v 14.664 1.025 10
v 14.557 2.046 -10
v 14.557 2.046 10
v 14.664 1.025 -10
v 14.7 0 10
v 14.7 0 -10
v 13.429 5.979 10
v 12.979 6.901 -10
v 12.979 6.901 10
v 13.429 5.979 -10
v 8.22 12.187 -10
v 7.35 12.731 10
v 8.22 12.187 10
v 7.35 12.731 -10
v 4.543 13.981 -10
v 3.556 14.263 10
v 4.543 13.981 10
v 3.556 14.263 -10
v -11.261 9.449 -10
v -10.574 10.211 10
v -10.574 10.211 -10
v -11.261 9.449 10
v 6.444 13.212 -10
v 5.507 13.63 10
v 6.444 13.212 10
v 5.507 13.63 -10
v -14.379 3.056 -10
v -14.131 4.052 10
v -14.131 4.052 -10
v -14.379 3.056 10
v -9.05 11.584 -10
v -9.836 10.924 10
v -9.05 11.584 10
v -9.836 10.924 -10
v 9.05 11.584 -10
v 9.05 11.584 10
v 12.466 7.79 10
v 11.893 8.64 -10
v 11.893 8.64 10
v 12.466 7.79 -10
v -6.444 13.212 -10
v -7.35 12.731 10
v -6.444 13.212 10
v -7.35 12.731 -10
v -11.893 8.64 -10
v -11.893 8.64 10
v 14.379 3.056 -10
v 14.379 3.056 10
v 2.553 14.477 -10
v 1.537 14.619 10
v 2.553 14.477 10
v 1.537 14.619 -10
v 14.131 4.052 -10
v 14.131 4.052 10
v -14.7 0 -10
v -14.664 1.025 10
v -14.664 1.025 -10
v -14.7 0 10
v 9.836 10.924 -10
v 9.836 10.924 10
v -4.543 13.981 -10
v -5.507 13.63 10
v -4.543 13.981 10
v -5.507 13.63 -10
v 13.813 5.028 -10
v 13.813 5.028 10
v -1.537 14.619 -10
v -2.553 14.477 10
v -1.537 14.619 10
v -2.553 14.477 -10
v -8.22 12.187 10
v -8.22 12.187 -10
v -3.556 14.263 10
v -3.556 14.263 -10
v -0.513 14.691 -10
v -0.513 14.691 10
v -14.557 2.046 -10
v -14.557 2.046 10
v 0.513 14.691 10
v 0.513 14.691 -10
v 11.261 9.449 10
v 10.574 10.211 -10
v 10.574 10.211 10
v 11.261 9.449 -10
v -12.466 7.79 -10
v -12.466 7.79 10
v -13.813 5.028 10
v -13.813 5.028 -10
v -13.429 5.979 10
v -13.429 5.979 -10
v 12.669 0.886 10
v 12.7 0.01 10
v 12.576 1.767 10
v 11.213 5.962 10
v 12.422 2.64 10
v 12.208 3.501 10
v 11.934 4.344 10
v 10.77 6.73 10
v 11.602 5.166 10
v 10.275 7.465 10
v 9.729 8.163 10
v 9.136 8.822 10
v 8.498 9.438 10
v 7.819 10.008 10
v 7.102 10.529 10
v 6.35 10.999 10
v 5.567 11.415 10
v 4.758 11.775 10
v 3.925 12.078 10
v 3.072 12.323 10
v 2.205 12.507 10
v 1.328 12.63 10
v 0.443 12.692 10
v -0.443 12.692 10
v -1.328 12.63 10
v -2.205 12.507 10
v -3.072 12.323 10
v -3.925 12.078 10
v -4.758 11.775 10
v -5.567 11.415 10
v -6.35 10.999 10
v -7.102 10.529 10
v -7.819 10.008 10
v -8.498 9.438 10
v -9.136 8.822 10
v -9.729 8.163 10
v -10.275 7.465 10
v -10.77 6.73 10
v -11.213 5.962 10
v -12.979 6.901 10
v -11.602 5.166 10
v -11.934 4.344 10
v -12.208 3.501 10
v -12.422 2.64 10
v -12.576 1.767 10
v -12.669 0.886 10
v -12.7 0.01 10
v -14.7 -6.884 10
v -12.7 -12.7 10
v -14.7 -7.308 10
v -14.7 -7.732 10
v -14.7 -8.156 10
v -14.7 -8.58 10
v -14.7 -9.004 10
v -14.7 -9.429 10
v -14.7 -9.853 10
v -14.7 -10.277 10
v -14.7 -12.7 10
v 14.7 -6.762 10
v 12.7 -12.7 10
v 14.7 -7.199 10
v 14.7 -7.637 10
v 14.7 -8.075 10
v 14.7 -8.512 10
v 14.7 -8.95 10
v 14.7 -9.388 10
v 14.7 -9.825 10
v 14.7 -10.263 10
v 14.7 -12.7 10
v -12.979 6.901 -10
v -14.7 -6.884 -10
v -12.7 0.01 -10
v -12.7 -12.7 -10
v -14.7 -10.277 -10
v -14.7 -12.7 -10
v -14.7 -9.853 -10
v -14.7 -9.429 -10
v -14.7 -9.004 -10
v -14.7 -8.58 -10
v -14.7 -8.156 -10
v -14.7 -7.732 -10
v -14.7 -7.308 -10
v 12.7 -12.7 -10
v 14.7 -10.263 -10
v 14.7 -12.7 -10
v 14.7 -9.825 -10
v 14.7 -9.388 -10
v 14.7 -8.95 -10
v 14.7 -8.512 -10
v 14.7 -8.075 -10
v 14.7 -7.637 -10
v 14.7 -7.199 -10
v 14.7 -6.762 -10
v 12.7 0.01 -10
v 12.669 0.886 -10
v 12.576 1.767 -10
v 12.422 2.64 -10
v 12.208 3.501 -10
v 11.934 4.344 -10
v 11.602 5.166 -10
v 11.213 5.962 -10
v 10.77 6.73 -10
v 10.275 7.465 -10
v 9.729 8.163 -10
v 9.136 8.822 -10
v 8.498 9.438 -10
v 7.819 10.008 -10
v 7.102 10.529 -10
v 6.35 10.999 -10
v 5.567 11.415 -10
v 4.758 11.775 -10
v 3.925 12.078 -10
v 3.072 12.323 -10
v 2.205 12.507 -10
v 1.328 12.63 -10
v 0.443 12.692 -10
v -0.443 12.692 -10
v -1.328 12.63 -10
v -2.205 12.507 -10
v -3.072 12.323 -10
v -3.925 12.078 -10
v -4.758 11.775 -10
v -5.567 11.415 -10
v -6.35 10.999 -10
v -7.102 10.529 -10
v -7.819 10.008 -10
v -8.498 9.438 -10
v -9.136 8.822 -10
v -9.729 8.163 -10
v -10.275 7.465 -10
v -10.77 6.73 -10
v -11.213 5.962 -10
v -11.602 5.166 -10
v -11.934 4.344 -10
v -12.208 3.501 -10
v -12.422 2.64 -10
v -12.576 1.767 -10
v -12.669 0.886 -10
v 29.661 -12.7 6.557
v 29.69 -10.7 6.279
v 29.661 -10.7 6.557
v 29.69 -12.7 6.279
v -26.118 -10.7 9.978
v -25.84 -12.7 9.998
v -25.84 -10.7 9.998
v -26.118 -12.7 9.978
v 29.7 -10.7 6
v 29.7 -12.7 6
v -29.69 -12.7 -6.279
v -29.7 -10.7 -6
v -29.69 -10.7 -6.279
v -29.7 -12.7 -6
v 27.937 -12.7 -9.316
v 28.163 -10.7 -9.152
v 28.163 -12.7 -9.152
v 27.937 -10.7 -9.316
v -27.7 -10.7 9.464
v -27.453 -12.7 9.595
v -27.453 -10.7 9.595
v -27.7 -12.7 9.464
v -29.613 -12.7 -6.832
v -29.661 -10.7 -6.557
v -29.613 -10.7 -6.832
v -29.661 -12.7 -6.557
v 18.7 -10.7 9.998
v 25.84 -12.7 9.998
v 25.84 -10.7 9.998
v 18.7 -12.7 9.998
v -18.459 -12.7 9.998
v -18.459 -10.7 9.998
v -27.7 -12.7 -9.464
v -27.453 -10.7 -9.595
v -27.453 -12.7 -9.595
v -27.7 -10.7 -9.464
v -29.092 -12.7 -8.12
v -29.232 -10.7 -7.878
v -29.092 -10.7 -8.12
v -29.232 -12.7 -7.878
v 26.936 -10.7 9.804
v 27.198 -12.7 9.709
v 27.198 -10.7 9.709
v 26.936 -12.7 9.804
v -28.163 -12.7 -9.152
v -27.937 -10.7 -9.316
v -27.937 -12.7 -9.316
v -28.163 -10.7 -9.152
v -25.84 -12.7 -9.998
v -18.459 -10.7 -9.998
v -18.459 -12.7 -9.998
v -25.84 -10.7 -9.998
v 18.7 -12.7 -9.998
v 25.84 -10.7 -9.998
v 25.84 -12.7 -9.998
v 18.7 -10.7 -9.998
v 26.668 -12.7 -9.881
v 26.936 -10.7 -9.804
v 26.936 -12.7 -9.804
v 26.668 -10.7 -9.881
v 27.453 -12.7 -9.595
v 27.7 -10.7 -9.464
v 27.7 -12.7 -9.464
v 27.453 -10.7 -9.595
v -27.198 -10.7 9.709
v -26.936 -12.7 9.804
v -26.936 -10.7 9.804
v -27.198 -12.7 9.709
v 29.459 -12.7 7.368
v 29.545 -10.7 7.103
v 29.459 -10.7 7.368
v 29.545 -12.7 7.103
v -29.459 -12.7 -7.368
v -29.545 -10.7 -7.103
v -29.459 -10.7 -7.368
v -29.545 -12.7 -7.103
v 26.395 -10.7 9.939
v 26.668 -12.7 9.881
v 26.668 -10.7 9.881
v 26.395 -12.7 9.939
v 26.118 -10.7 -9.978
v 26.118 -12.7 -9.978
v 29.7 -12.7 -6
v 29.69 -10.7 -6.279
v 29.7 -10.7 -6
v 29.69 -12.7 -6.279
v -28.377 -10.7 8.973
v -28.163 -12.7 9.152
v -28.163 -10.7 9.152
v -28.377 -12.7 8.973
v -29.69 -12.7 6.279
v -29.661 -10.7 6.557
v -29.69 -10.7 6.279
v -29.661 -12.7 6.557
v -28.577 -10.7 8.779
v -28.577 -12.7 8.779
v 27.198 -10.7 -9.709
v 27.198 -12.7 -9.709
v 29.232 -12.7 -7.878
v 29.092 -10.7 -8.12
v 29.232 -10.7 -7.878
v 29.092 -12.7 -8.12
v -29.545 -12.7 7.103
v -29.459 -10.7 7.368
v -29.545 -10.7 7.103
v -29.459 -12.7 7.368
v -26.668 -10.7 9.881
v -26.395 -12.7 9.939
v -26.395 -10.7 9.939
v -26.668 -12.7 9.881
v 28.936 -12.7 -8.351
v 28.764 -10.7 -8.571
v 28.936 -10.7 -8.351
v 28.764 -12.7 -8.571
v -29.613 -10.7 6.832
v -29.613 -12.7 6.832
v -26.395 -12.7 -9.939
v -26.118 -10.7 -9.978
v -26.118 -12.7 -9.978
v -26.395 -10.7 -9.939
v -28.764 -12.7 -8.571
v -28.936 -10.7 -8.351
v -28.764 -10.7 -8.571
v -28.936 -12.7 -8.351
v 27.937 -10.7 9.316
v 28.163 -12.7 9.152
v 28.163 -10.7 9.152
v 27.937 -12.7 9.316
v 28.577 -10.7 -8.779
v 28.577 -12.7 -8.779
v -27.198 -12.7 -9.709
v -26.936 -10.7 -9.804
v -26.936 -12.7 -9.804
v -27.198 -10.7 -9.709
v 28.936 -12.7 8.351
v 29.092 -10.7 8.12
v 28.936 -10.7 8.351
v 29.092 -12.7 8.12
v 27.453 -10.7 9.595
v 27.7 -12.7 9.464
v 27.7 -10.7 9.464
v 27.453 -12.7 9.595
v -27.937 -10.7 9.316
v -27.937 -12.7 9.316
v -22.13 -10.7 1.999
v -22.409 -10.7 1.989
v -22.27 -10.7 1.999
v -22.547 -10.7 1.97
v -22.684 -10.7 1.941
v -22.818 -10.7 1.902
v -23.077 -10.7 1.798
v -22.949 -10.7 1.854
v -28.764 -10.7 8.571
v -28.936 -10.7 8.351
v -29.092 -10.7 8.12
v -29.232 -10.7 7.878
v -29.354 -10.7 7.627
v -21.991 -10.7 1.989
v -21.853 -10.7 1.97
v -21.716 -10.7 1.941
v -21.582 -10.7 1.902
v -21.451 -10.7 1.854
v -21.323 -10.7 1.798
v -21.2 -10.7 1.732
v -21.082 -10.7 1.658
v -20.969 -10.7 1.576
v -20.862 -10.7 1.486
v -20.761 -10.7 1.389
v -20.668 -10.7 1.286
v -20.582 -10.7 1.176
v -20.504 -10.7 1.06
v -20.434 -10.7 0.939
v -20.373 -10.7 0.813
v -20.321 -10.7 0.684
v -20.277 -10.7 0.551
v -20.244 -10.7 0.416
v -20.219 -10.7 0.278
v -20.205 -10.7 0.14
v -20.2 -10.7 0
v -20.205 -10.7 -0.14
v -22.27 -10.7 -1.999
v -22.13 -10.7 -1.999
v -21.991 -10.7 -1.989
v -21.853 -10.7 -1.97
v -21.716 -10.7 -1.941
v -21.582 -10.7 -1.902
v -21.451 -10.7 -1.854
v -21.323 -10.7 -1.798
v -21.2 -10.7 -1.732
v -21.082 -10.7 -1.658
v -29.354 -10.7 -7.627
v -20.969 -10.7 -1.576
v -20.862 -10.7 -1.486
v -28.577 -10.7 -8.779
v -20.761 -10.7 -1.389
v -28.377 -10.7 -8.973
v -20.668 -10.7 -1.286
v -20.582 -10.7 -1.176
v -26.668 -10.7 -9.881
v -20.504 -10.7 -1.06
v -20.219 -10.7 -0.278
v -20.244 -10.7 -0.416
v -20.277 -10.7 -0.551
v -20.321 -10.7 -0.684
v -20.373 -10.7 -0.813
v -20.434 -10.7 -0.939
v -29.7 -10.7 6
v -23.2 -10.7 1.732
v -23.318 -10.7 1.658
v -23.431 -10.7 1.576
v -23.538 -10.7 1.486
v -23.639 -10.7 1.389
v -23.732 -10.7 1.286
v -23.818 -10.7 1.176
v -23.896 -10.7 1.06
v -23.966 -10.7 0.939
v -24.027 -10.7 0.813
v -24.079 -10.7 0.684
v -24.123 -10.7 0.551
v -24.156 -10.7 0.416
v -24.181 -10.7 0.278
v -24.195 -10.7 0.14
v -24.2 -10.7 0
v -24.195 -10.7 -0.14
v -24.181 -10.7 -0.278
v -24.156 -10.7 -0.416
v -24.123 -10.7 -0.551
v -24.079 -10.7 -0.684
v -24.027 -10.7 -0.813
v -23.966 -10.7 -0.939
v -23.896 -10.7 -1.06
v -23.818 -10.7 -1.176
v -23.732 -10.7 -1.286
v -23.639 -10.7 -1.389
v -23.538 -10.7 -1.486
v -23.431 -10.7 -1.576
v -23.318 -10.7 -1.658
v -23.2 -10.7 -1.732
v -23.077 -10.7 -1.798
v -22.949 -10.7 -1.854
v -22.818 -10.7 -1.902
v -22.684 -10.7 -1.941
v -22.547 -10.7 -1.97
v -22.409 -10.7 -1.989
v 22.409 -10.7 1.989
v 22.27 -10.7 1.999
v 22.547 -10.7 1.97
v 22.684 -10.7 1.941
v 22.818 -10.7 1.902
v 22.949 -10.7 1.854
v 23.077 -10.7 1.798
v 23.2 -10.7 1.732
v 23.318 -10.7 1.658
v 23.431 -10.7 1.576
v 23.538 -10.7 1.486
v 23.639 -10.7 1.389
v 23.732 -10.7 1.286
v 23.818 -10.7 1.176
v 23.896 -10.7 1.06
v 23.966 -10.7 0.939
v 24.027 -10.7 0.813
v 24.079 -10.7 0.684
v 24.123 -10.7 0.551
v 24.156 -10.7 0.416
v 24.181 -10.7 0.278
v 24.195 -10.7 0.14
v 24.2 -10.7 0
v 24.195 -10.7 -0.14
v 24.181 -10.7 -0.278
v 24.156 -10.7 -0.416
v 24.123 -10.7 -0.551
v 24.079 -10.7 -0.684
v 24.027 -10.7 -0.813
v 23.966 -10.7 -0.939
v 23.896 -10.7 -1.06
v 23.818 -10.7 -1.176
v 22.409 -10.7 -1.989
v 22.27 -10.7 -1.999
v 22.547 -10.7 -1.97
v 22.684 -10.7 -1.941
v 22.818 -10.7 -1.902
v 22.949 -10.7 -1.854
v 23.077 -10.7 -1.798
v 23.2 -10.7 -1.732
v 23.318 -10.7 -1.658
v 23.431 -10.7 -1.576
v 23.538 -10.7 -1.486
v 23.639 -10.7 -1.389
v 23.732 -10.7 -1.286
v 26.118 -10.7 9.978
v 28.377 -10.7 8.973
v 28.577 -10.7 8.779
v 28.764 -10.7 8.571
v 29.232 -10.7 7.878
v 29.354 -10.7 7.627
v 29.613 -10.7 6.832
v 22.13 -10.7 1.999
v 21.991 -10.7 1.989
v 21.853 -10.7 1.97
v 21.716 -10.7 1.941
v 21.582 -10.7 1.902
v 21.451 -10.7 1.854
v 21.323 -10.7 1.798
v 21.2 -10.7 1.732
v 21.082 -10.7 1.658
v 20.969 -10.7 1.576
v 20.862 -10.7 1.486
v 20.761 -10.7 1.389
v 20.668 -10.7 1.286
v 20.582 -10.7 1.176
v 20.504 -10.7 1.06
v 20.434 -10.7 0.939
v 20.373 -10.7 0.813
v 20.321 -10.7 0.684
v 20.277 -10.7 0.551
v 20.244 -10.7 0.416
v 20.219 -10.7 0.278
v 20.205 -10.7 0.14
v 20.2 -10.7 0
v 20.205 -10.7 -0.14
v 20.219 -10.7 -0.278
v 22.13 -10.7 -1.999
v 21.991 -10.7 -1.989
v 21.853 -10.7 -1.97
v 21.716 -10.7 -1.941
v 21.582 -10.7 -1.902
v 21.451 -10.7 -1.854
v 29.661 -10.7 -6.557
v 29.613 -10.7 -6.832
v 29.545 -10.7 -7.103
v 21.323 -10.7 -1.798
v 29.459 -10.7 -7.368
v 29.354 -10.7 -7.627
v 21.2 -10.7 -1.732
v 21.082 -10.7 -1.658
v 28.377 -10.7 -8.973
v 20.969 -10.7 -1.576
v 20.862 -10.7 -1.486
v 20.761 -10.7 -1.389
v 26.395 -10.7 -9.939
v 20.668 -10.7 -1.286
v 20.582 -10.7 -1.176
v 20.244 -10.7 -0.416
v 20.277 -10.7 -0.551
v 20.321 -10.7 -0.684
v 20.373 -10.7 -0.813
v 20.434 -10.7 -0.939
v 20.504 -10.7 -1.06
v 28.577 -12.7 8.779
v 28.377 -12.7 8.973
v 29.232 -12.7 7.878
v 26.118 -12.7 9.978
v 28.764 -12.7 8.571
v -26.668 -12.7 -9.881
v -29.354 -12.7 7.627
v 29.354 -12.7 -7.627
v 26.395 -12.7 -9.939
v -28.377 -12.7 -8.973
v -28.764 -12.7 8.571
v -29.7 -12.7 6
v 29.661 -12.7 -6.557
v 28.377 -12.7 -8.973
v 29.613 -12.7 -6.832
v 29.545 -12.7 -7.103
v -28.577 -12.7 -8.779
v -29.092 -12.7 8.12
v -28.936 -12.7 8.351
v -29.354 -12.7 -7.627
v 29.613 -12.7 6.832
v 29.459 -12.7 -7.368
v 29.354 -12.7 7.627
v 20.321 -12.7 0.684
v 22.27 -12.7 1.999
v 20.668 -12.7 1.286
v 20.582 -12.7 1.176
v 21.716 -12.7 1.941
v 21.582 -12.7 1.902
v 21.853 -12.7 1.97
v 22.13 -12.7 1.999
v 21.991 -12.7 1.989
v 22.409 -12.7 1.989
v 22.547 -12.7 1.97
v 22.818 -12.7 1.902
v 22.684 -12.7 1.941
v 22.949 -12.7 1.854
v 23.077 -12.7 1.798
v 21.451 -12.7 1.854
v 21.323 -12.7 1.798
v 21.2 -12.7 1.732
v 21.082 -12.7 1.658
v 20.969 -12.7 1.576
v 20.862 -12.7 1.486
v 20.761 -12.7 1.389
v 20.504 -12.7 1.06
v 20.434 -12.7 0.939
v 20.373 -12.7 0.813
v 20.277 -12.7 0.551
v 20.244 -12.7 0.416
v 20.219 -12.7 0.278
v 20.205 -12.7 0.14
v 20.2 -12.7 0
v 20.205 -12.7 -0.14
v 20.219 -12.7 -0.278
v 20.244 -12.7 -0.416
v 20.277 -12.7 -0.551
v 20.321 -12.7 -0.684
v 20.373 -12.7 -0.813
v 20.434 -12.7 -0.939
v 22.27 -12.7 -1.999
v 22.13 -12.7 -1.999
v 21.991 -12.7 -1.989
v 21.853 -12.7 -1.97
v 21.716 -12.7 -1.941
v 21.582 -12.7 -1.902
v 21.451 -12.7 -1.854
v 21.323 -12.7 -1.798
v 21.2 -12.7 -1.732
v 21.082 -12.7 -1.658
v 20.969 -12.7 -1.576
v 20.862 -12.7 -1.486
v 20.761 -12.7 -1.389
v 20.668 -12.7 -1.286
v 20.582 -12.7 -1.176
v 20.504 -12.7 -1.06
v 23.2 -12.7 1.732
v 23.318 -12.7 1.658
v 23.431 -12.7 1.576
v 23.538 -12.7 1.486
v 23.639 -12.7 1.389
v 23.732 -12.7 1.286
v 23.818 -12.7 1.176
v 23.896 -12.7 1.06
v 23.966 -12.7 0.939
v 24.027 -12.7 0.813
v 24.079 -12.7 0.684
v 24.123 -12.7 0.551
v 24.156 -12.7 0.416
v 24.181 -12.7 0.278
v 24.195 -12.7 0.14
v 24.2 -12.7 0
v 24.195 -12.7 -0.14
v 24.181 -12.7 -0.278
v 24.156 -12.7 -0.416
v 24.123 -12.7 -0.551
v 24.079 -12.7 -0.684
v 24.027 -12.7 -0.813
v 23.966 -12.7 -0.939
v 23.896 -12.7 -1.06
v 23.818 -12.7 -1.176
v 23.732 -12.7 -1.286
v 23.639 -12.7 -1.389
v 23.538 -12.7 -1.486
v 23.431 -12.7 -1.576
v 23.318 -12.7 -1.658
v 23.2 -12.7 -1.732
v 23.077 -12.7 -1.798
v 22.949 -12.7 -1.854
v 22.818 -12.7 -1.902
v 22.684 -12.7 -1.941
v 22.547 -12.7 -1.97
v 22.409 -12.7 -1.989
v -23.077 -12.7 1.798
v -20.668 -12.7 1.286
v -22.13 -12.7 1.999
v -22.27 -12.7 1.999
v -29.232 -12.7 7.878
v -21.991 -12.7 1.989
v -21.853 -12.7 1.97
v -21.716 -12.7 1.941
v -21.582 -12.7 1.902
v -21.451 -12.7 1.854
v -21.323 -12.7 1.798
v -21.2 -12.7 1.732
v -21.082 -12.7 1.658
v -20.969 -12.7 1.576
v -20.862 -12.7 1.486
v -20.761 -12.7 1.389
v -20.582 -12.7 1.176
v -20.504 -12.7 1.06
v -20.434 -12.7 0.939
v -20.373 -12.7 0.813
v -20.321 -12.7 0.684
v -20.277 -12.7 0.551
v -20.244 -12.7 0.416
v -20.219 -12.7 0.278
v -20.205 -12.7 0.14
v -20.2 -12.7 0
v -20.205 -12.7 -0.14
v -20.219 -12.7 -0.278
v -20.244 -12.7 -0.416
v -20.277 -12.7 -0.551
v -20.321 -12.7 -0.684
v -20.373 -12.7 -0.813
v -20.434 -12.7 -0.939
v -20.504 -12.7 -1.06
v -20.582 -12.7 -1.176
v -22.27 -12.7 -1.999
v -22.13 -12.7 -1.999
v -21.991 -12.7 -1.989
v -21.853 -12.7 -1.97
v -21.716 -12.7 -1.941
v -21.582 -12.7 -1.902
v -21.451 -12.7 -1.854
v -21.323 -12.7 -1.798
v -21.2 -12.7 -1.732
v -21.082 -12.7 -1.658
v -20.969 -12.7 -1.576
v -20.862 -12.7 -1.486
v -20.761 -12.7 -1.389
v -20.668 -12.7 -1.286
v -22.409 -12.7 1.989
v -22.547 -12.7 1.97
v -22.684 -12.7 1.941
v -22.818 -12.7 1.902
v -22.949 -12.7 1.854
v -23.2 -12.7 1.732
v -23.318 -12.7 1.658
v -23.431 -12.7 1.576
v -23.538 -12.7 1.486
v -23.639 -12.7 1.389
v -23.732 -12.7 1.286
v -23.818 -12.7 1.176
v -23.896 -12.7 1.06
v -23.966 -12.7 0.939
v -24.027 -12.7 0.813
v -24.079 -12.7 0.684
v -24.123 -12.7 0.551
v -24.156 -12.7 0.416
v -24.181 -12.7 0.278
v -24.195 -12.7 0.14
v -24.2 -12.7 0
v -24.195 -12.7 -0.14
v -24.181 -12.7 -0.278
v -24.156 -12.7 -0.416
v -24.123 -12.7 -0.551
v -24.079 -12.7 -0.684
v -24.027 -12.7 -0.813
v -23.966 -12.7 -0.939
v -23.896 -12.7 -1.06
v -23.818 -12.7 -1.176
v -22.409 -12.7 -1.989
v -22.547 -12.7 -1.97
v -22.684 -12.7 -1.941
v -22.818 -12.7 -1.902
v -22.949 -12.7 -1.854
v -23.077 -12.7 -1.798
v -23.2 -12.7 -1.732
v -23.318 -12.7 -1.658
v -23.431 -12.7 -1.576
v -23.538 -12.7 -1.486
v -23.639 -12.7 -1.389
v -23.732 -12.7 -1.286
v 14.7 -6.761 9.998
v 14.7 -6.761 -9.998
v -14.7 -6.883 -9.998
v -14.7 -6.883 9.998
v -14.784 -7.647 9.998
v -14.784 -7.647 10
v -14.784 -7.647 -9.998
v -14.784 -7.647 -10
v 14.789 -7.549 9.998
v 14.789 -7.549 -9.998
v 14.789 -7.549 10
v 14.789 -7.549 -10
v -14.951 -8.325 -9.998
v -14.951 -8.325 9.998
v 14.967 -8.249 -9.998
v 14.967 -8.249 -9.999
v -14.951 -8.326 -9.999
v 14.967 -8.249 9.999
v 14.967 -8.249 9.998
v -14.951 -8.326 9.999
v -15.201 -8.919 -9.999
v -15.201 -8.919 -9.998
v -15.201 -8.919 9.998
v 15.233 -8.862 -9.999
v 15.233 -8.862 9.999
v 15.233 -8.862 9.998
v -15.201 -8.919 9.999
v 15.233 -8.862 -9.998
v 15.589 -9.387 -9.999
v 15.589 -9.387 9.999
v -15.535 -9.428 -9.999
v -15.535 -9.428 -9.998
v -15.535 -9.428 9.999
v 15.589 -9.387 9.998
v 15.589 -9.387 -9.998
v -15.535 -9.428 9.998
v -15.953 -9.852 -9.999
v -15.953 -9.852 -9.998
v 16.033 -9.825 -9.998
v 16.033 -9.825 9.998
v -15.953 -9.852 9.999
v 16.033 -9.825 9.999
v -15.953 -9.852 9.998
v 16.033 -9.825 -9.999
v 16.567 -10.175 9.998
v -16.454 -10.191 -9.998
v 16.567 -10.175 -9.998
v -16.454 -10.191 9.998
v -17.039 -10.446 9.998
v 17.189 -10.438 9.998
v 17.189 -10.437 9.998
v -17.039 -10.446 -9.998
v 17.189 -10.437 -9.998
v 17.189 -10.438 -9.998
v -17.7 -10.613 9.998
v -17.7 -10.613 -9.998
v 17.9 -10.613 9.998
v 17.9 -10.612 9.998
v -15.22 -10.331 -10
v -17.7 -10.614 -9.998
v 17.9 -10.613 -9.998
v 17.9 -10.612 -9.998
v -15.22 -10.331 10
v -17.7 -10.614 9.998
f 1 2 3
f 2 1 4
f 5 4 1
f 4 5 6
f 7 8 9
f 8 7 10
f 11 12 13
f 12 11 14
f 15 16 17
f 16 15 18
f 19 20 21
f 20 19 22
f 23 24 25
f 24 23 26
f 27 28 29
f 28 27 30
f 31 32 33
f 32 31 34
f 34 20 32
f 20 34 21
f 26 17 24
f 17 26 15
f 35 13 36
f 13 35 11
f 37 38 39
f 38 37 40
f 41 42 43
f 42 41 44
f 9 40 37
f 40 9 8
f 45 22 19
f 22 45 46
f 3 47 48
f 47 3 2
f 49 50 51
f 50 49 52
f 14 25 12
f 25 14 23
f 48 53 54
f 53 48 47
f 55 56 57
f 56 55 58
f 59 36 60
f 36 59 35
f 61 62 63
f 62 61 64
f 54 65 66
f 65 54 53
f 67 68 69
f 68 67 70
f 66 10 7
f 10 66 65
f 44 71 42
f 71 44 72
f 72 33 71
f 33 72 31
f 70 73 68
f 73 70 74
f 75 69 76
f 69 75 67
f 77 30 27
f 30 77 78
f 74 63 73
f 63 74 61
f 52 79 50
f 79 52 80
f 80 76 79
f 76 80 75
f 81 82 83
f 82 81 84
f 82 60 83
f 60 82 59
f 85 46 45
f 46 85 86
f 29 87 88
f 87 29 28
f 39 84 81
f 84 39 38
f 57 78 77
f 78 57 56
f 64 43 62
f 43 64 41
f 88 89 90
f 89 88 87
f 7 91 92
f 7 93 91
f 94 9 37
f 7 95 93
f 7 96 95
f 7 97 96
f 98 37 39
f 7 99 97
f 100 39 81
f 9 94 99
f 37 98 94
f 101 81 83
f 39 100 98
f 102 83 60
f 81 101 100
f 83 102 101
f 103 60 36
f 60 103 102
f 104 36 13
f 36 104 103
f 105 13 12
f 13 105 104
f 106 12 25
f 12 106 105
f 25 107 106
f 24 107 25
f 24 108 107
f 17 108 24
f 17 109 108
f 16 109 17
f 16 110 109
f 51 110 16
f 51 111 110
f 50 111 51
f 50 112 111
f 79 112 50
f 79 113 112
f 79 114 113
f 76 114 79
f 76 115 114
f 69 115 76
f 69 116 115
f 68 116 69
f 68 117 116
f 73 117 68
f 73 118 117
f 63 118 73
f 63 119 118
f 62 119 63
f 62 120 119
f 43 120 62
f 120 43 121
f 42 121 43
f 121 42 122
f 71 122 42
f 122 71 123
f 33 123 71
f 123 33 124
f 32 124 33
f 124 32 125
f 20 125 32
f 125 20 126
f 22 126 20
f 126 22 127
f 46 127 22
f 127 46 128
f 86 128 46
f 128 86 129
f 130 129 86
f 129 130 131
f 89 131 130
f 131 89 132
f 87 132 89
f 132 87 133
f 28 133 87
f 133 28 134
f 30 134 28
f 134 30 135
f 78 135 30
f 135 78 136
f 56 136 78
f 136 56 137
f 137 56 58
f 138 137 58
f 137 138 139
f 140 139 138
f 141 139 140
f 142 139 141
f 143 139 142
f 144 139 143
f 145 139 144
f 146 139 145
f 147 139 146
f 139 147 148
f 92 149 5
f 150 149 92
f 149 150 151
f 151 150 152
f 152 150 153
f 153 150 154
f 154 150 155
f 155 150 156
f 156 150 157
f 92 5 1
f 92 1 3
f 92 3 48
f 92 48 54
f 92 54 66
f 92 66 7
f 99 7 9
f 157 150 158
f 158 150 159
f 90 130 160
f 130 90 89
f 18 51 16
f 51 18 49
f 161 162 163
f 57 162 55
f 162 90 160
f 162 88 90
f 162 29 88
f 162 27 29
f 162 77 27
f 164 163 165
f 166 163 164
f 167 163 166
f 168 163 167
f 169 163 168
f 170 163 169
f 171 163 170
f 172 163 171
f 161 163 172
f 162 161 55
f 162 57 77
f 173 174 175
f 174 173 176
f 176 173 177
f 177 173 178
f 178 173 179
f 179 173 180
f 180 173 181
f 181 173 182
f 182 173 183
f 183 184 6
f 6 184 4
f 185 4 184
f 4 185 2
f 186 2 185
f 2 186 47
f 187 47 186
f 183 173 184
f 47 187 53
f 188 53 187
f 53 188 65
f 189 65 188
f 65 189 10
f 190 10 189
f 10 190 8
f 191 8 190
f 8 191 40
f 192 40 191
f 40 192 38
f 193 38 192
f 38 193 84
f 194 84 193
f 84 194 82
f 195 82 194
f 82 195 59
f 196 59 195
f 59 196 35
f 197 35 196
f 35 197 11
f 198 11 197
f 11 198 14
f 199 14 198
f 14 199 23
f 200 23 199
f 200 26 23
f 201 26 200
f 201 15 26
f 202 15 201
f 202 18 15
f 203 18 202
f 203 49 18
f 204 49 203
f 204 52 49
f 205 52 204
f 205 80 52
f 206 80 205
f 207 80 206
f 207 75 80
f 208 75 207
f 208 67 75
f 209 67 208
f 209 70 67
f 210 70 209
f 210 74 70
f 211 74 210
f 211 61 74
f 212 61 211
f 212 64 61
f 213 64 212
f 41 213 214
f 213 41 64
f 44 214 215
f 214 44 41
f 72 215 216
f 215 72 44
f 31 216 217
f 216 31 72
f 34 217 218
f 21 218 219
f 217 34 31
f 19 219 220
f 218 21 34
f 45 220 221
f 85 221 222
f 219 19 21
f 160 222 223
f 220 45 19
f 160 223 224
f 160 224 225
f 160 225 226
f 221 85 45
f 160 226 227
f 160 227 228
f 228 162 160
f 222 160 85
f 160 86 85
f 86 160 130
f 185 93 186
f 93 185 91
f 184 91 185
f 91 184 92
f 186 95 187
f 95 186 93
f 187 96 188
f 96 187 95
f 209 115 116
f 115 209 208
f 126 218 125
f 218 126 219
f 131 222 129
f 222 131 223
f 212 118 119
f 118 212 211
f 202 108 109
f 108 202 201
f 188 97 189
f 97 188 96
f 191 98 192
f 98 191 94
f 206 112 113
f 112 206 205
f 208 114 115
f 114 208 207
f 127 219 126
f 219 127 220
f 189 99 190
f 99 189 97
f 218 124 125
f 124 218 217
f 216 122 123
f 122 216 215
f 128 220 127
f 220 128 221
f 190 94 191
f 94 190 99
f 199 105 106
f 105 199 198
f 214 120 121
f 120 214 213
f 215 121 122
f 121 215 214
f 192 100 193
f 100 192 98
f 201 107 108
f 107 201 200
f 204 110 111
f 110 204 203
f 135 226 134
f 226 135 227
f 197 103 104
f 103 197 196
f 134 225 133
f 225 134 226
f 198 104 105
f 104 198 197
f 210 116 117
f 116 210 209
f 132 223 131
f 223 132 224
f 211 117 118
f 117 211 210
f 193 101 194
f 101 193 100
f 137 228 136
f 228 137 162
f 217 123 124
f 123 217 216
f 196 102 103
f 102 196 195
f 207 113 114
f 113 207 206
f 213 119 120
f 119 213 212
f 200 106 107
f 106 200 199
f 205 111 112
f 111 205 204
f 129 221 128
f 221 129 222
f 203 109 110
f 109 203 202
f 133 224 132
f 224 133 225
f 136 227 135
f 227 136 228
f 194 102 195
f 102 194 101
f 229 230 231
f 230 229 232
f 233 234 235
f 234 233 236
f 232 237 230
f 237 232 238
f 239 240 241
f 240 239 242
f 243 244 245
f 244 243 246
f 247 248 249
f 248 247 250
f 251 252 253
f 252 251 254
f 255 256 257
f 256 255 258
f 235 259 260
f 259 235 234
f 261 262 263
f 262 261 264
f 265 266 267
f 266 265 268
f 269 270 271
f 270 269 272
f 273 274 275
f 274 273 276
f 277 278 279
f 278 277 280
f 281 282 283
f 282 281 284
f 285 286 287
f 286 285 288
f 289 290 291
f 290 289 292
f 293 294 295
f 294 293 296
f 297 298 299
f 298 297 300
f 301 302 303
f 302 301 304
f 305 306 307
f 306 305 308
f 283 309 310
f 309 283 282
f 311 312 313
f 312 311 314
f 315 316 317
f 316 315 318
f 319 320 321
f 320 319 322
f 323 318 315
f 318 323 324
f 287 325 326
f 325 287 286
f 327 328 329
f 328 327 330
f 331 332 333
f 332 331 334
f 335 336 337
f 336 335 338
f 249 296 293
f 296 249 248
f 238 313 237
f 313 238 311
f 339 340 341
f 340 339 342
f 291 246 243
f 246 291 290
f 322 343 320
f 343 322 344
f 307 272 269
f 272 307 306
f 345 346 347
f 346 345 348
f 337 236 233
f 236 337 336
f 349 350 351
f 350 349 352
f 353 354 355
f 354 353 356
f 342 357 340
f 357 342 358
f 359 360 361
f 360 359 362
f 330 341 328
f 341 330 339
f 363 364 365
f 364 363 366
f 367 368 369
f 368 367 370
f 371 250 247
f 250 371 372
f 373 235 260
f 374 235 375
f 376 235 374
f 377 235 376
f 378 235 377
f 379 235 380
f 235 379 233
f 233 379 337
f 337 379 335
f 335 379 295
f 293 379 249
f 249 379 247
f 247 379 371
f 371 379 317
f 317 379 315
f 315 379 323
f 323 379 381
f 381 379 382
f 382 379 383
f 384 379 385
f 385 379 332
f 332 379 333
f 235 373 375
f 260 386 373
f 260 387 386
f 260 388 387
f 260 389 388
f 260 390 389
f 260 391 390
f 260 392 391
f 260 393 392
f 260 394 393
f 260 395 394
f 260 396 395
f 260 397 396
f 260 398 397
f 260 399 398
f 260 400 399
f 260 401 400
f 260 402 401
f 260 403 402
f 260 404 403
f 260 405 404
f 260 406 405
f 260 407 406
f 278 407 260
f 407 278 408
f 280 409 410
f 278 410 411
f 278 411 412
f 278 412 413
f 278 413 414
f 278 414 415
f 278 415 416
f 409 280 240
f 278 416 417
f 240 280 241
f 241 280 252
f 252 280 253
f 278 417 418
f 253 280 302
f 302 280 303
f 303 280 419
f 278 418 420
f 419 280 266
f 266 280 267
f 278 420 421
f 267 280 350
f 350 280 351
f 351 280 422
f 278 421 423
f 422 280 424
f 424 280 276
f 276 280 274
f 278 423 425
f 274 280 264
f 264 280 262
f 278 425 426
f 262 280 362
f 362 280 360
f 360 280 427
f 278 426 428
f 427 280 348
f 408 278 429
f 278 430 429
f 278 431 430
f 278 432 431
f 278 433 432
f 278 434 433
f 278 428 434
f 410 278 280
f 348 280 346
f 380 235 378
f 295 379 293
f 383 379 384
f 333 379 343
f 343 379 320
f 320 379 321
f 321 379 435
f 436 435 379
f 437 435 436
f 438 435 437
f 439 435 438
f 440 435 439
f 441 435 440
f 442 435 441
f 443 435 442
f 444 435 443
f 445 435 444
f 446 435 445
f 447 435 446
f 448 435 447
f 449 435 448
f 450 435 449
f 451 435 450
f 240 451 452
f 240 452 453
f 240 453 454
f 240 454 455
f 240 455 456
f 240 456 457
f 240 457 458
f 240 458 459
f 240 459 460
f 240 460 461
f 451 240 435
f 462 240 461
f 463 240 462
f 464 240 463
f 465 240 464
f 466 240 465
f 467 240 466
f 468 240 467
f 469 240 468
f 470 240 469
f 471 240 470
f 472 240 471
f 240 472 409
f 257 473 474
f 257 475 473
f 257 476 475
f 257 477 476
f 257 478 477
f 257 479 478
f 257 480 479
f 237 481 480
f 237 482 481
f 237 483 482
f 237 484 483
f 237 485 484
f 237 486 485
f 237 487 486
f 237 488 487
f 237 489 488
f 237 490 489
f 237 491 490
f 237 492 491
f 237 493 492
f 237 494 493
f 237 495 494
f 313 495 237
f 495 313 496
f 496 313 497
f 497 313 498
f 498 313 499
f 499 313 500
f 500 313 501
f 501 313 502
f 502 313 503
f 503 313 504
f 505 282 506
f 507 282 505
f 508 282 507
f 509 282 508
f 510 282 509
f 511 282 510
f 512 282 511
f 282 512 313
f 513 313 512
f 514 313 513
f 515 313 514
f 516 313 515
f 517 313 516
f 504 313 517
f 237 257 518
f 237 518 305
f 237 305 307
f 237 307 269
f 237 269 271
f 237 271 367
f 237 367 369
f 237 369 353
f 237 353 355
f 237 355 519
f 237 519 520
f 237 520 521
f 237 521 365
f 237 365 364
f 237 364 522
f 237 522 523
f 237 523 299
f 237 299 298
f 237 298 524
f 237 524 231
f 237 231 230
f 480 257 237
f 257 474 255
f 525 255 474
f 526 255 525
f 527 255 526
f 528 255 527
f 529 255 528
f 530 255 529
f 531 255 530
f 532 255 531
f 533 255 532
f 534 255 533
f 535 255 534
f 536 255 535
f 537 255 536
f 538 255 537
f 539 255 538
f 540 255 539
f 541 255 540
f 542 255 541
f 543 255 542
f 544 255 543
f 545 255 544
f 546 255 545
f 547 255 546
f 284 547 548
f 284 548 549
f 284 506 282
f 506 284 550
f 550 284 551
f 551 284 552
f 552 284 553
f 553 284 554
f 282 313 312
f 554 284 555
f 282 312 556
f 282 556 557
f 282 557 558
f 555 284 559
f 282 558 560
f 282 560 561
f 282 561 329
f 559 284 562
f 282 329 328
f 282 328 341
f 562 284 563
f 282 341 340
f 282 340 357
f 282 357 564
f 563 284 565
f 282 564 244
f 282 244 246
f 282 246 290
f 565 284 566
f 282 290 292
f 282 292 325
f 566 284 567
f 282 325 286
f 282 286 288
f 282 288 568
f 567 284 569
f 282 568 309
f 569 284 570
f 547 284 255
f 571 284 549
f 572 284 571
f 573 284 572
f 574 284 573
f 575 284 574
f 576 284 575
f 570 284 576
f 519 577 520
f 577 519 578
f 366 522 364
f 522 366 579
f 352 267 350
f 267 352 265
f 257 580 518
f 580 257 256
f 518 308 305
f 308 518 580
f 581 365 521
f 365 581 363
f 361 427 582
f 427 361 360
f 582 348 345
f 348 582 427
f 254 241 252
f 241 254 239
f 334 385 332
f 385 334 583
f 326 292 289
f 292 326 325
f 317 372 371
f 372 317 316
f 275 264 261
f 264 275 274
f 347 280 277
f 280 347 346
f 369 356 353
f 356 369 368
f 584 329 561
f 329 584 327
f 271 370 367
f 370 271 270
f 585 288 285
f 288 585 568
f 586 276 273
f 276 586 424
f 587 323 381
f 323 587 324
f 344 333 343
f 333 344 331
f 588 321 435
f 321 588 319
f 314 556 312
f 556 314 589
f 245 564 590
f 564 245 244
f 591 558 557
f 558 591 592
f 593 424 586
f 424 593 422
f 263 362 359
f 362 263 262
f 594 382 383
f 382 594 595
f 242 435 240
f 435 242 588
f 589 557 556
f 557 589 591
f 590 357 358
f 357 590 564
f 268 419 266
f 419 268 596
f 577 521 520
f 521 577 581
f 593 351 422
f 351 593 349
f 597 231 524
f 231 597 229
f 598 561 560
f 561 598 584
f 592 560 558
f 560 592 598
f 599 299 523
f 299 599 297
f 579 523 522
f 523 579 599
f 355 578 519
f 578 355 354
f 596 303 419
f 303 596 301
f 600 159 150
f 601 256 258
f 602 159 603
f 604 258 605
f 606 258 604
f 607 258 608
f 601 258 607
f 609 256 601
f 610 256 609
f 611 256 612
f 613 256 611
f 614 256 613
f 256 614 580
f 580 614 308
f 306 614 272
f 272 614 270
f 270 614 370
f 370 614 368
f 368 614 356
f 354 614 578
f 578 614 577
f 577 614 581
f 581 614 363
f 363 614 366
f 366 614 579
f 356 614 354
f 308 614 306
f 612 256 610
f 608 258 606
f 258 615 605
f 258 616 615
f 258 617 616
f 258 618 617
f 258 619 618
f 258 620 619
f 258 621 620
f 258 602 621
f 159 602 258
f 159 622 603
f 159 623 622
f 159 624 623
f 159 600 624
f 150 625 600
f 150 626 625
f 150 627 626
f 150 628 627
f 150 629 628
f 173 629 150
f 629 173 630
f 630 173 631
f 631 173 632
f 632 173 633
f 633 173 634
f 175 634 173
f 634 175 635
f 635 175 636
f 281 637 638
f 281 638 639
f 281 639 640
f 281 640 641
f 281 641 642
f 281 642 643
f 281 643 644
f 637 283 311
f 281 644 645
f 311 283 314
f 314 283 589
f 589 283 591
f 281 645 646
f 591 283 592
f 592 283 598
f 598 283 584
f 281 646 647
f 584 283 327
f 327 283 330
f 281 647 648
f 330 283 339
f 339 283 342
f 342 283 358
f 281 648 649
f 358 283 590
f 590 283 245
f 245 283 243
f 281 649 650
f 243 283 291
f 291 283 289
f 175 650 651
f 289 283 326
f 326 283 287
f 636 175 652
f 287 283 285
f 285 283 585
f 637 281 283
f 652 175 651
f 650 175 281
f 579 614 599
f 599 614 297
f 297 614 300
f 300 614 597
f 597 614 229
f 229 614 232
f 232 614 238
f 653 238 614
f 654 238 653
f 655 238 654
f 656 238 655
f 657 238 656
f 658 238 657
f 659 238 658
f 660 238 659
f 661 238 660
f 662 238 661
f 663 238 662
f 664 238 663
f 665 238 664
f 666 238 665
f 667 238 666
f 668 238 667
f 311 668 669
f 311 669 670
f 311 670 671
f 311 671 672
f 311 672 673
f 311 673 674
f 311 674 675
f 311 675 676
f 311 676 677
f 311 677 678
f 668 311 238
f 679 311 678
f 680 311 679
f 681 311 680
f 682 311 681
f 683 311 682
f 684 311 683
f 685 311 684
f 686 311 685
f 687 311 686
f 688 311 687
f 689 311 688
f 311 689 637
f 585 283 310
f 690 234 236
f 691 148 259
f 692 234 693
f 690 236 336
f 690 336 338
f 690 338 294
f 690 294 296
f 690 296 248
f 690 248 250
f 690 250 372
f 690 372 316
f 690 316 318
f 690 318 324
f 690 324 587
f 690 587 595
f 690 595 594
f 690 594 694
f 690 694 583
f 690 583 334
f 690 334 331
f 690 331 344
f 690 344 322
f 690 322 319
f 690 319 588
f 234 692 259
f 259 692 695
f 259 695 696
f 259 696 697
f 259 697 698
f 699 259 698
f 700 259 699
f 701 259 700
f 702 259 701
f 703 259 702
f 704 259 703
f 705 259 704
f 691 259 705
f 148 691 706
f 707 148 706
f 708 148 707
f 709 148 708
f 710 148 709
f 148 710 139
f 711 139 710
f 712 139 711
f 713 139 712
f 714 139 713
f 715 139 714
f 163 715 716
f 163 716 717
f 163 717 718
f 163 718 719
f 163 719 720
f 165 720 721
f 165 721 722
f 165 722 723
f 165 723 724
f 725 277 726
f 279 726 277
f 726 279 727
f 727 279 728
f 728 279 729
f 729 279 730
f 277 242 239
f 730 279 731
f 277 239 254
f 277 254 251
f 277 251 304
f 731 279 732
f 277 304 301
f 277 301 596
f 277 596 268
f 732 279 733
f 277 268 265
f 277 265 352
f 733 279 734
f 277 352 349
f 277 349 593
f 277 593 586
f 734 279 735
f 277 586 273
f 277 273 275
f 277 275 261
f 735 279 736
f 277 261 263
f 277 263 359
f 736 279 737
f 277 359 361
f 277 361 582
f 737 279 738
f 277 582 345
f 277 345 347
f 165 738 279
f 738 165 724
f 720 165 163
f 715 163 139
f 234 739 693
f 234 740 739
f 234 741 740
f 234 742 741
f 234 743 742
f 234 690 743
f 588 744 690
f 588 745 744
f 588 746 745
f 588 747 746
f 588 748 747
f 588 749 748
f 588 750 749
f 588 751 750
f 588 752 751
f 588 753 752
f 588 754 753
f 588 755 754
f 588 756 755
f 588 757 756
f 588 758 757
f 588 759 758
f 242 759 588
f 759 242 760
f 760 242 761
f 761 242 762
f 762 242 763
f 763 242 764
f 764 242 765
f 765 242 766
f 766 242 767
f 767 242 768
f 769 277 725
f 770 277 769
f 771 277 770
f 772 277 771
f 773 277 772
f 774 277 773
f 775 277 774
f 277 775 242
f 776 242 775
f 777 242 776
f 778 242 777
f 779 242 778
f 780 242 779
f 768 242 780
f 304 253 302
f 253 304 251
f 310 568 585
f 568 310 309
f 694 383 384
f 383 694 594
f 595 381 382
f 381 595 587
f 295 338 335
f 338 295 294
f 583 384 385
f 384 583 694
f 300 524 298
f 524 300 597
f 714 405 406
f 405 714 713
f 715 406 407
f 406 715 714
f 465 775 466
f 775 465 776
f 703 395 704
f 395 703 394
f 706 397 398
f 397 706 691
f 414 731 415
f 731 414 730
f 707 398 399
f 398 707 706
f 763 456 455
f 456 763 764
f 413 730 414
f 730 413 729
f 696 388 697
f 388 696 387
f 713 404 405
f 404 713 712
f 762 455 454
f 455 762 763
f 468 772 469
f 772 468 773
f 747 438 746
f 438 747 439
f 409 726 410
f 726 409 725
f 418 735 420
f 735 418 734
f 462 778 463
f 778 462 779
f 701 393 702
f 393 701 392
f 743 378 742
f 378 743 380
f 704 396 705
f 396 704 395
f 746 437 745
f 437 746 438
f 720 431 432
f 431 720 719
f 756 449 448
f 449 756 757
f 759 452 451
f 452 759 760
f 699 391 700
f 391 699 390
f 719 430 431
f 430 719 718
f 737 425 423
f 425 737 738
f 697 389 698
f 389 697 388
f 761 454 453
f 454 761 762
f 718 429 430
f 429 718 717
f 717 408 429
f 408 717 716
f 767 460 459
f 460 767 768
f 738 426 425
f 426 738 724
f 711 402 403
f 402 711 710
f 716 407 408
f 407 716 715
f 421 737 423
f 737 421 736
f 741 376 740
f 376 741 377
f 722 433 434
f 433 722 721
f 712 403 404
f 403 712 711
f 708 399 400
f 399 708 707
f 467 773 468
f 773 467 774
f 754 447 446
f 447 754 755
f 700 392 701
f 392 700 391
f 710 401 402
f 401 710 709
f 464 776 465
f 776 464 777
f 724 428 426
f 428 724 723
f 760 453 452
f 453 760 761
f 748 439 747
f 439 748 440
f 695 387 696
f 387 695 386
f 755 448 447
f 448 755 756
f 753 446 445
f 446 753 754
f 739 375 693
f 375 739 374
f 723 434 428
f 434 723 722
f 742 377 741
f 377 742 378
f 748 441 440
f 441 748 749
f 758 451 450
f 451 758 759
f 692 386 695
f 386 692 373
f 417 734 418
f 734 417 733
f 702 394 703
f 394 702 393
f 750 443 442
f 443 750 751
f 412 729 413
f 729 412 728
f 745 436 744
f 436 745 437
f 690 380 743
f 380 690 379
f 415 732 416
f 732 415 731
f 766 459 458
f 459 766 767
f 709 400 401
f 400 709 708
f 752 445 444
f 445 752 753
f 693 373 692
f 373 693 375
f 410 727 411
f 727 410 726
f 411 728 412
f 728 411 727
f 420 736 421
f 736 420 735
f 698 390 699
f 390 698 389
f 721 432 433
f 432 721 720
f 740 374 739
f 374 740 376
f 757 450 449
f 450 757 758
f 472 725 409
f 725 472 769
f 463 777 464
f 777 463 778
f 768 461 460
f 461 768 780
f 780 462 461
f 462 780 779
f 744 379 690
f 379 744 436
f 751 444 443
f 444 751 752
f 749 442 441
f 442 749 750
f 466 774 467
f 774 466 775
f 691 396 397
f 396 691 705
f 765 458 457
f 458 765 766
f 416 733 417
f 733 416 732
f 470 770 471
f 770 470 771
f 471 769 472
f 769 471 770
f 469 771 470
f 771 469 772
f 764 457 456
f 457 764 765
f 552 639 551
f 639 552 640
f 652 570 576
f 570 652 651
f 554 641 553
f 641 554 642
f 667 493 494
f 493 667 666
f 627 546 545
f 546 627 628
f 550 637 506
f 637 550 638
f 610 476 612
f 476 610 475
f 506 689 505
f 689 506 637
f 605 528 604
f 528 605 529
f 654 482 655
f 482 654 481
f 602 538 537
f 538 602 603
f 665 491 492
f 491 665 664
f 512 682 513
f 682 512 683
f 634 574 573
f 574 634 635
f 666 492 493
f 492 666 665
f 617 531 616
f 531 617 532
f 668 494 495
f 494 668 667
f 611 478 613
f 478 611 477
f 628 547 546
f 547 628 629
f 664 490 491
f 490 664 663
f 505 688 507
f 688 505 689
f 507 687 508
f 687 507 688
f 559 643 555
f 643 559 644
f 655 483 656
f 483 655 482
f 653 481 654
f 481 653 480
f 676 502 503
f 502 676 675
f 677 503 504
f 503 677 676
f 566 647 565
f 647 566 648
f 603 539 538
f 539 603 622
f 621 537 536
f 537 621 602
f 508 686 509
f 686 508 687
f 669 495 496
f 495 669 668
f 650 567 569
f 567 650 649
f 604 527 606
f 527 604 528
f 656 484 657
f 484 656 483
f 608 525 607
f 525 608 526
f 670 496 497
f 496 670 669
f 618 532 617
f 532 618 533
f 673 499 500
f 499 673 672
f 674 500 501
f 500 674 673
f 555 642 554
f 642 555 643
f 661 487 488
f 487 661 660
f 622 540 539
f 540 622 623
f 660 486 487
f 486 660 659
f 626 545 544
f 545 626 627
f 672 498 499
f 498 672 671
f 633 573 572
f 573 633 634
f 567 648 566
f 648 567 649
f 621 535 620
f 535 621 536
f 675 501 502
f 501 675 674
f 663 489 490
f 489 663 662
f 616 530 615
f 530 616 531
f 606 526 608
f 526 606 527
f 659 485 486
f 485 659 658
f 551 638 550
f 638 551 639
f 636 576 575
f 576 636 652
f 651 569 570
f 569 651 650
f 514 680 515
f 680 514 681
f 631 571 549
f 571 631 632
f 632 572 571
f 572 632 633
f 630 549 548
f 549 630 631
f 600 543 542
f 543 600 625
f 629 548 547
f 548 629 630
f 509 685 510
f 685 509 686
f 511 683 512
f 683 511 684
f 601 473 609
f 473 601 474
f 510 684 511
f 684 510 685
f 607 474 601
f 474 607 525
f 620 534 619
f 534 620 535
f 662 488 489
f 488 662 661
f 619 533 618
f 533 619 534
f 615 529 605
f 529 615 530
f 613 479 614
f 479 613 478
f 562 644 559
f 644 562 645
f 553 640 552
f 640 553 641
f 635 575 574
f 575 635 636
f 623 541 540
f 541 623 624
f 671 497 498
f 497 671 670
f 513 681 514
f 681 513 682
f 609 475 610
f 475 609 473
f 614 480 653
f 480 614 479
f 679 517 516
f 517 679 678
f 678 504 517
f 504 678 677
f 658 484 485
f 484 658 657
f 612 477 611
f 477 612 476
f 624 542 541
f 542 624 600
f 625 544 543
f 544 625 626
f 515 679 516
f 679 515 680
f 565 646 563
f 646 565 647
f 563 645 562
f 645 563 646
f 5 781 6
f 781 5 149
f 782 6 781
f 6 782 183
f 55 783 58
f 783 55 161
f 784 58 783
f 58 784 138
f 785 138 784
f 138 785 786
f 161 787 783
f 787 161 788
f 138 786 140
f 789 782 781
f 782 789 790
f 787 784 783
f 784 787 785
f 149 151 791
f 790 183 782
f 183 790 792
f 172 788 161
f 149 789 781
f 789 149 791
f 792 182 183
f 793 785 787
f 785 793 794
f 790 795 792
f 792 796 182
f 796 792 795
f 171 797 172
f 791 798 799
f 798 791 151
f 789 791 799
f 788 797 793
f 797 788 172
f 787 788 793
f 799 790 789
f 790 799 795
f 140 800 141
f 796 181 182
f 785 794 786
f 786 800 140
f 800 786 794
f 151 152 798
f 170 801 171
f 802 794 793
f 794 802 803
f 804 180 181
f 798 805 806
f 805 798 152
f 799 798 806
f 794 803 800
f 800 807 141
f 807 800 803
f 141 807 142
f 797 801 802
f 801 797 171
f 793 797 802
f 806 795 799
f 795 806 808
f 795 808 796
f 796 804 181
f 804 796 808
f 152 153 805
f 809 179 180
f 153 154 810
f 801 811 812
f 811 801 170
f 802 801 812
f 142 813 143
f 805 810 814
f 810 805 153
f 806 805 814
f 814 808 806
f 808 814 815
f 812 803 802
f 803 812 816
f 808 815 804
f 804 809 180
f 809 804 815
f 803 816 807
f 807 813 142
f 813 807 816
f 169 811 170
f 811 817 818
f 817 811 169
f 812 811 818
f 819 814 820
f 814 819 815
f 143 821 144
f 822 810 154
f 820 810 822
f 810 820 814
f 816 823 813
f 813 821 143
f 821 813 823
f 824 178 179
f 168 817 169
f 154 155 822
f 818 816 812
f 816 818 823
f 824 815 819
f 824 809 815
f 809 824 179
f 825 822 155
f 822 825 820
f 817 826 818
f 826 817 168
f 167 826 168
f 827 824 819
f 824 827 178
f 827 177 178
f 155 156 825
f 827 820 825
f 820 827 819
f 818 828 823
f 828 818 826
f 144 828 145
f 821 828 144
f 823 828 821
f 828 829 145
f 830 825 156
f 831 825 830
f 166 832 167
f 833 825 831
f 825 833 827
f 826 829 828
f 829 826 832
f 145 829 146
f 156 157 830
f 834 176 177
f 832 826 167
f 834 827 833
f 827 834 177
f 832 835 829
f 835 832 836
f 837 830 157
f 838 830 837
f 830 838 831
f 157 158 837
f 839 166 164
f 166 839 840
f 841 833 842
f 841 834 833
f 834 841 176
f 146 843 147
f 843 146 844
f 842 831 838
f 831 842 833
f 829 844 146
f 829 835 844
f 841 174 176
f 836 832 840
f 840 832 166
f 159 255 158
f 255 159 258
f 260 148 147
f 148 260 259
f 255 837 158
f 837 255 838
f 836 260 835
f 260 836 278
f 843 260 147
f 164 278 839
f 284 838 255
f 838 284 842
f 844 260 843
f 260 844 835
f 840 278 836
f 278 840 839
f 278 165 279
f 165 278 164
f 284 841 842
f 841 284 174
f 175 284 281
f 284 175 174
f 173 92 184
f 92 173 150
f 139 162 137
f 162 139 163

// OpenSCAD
// Refined Parametric Saddle Clamp
// Original by Shane Graper (sgraber)
// Last Modified by Bill Gertz (billgertz) on 10 December 2015
// Version 0.9.3
// Fillet Modules by Andrew Plumb from the Clothbot Creations GitHub repository 
//     see: https://github.com/clothbot/ClothBotCreations/blob/master/utilities/fillet.scad
//
// This program is free software: you can redistribute it and/or modify
//  it under the terms of the GNU General Public License as published by
//  the Free Software Foundation, either version 3 of the License, or
//  (at your option) any later version.
//
//  This program is distributed in the hope that it will be useful,
//  but WITHOUT ANY WARRANTY; without even the implied warranty of
//  MERCHANTABILITY or FITNESS FOR A PARTICULAR PURPOSE.  See the
//  GNU General Public License for more details.
//
//  You should have received a copy of the GNU General Public License
//  along with this program.  If not, see <http://www.gnu.org/licenses/>.
//
//
// Version  Author          Change
// -------  -------------   ------------------------------------------------------------------------------------------
//   0.9.2  billgertz       Documentation starts with this revision - sorry for not starting with orginal modification
//   0.9.3  billgertz       Replaced roundedBox module with new simpler Minkowski version
//                          Removed old roundedBox module by Clifford Wolf and Marius Kintel (thanks guys!)
//                          Corrected tab placement to ensure flush with ID (thanks to MobyDisk reporting problem)
//                          Cleaned up resolution on circular objects and nudging on object differences
//                          Tweaked mount hole placement to stay out of way filleting

// Parametric Saddle Clamp

/* [Pipe Saddle] */
// units
pipe_units = "mm";     // [mm,inches] 
// diameter of the pipe to hang
pipe_diameter = 25.4;  // 
// width of the strap (mm)

/* [Strap] */
strap_width = 20;	  // [10:Narrow,20:Typical,30:Wide,40:Wider,50:Widest]
// screw tab extends from the saddle (mm)
strap_tab = 15;		  // [15:Shorter,30:Short,45:Long,60:Longer]
// strap thickness (mm)
strap_thickness = 2;  // [2:Typical,4:Robust,6:Heavy duty]
// screw hole diameter (mm)
hole_diameter = 4;    // [2:15]

/* [Advanced] */
// strap to tab fillet radius (mm)
fillet_radius = 4;    // [2:Slight,4:Typical,6:Full]
// strap chamfer radius
chamfer_radius = 4;   // [2:Slight,4:Typical,6:Full]
// line segments per full circle
resolution = 90;      // [30:Rough,60:Coarse,90:Fine,180:Smooth,360:Insane]

// No need to edit beyond here unless you want to change how the object is rendered

/* [Hidden] */
hole_rad = hole_diameter/2;

inchMetric = 25.4;   // Length of inch in mm
pipe_OD = (pipe_units == "inches") ? pipe_diameter * inchMetric : pipe_diameter;
pipe_rad = pipe_OD/2;
nudge = 0.01;

///////////// Andrew Plumb Clothbot Creation fillet Modules /////////////

module fillet(r=1.0,steps=3,include=true) {
  if(include) for (k=[0:$children-1]) {
	children(k);
  }
  for (i=[0:$children-2] ) {
    for(j=[i+1:$children-1] ) {
	  fillet_two(r=r,steps=steps) {
	    children(i);
	    children(j);
	    intersection() {
		  children(i);
		  children(j);
	    }
	  }
    }
  }
}

module fillet_two(r=1.0,steps=3) {
  for(step=[1:steps]) {
	hull() {
	  render() intersection() {
		children(0);
		offset_3d(r=r*step/steps) children(2);
	  }
	  render() intersection() {
		children(1);
		offset_3d(r=r*(steps-step+1)/steps) children(2);
	  }
	}
  }
}


module offset_3d(r=1.0) {
  for(k=[0:$children-1]) minkowski() {
	children(k);
	sphere(r=r,$fn=resolution/10);
  }
}

///////////// Thanks Andrew Plumb /////////////

// new rounded box using minkowski replaces 22 lines of code with just 4!
// size is a vector [w, h, d]
module roundedBox(size, radius, resolution)
{
    minkowski () {
        cylinder(r=radius, h=size.z/2, center=true, $fn=resolution);
        cube(size=[size.x - radius*2, size.y - radius*2, size.z/2], center=true);
    }
}

///////////// End Object Modules /////////////

difference() {

    //join the pipe and the filleted saddle straps
    union() {
        
        // the pipe
        difference() {
            cylinder(r=pipe_rad+strap_thickness, h=strap_width, center=true, $fn=resolution);
            cylinder(r=pipe_rad, h=strap_width*(1+nudge), center=true, $fn=resolution); // nudge strap width by a bit for full center saddle removal
        }

        // fillet the straps and the saddle together
        fillet(r=fillet_radius, steps=resolution/10) {
            // subtract mount holes to make the tabs
            difference() {
                translate([0, -pipe_rad+strap_thickness/2, 0]) rotate([90, 0, 0]) roundedBox(size=[strap_tab*2+pipe_OD+2*strap_thickness, strap_width, strap_thickness], radius=chamfer_radius, resolution=resolution);
                translate([-pipe_rad-strap_tab/2-fillet_radius/2, -pipe_rad+strap_thickness/2, 0]) rotate([90, 0, 0]) cylinder(r=hole_rad, h=strap_thickness*(1+nudge), center=true, $fn=resolution);
                translate([pipe_rad+strap_tab/2+fillet_radius/2, -pipe_rad+strap_thickness/2, 0]) rotate([90, 0, 0]) cylinder(r=hole_rad, h=strap_thickness*(1+nudge), center=true, $fn=resolution);
            }

            // make the saddle
            translate([0, -pipe_rad/2, 0]) cube(size=[pipe_OD+strap_thickness*2, pipe_rad, strap_width], center=true);
        
        }
   
    }

    // finish bridge by subtracting from middle to seperate straps, nudge strap width and hright by a bit to remove ghost
    translate([0, -pipe_rad/2-strap_thickness+nudge, 0]) cube(size=[pipe_OD, pipe_rad+strap_thickness*2, strap_width*(1+nudge)], center=true);
}
